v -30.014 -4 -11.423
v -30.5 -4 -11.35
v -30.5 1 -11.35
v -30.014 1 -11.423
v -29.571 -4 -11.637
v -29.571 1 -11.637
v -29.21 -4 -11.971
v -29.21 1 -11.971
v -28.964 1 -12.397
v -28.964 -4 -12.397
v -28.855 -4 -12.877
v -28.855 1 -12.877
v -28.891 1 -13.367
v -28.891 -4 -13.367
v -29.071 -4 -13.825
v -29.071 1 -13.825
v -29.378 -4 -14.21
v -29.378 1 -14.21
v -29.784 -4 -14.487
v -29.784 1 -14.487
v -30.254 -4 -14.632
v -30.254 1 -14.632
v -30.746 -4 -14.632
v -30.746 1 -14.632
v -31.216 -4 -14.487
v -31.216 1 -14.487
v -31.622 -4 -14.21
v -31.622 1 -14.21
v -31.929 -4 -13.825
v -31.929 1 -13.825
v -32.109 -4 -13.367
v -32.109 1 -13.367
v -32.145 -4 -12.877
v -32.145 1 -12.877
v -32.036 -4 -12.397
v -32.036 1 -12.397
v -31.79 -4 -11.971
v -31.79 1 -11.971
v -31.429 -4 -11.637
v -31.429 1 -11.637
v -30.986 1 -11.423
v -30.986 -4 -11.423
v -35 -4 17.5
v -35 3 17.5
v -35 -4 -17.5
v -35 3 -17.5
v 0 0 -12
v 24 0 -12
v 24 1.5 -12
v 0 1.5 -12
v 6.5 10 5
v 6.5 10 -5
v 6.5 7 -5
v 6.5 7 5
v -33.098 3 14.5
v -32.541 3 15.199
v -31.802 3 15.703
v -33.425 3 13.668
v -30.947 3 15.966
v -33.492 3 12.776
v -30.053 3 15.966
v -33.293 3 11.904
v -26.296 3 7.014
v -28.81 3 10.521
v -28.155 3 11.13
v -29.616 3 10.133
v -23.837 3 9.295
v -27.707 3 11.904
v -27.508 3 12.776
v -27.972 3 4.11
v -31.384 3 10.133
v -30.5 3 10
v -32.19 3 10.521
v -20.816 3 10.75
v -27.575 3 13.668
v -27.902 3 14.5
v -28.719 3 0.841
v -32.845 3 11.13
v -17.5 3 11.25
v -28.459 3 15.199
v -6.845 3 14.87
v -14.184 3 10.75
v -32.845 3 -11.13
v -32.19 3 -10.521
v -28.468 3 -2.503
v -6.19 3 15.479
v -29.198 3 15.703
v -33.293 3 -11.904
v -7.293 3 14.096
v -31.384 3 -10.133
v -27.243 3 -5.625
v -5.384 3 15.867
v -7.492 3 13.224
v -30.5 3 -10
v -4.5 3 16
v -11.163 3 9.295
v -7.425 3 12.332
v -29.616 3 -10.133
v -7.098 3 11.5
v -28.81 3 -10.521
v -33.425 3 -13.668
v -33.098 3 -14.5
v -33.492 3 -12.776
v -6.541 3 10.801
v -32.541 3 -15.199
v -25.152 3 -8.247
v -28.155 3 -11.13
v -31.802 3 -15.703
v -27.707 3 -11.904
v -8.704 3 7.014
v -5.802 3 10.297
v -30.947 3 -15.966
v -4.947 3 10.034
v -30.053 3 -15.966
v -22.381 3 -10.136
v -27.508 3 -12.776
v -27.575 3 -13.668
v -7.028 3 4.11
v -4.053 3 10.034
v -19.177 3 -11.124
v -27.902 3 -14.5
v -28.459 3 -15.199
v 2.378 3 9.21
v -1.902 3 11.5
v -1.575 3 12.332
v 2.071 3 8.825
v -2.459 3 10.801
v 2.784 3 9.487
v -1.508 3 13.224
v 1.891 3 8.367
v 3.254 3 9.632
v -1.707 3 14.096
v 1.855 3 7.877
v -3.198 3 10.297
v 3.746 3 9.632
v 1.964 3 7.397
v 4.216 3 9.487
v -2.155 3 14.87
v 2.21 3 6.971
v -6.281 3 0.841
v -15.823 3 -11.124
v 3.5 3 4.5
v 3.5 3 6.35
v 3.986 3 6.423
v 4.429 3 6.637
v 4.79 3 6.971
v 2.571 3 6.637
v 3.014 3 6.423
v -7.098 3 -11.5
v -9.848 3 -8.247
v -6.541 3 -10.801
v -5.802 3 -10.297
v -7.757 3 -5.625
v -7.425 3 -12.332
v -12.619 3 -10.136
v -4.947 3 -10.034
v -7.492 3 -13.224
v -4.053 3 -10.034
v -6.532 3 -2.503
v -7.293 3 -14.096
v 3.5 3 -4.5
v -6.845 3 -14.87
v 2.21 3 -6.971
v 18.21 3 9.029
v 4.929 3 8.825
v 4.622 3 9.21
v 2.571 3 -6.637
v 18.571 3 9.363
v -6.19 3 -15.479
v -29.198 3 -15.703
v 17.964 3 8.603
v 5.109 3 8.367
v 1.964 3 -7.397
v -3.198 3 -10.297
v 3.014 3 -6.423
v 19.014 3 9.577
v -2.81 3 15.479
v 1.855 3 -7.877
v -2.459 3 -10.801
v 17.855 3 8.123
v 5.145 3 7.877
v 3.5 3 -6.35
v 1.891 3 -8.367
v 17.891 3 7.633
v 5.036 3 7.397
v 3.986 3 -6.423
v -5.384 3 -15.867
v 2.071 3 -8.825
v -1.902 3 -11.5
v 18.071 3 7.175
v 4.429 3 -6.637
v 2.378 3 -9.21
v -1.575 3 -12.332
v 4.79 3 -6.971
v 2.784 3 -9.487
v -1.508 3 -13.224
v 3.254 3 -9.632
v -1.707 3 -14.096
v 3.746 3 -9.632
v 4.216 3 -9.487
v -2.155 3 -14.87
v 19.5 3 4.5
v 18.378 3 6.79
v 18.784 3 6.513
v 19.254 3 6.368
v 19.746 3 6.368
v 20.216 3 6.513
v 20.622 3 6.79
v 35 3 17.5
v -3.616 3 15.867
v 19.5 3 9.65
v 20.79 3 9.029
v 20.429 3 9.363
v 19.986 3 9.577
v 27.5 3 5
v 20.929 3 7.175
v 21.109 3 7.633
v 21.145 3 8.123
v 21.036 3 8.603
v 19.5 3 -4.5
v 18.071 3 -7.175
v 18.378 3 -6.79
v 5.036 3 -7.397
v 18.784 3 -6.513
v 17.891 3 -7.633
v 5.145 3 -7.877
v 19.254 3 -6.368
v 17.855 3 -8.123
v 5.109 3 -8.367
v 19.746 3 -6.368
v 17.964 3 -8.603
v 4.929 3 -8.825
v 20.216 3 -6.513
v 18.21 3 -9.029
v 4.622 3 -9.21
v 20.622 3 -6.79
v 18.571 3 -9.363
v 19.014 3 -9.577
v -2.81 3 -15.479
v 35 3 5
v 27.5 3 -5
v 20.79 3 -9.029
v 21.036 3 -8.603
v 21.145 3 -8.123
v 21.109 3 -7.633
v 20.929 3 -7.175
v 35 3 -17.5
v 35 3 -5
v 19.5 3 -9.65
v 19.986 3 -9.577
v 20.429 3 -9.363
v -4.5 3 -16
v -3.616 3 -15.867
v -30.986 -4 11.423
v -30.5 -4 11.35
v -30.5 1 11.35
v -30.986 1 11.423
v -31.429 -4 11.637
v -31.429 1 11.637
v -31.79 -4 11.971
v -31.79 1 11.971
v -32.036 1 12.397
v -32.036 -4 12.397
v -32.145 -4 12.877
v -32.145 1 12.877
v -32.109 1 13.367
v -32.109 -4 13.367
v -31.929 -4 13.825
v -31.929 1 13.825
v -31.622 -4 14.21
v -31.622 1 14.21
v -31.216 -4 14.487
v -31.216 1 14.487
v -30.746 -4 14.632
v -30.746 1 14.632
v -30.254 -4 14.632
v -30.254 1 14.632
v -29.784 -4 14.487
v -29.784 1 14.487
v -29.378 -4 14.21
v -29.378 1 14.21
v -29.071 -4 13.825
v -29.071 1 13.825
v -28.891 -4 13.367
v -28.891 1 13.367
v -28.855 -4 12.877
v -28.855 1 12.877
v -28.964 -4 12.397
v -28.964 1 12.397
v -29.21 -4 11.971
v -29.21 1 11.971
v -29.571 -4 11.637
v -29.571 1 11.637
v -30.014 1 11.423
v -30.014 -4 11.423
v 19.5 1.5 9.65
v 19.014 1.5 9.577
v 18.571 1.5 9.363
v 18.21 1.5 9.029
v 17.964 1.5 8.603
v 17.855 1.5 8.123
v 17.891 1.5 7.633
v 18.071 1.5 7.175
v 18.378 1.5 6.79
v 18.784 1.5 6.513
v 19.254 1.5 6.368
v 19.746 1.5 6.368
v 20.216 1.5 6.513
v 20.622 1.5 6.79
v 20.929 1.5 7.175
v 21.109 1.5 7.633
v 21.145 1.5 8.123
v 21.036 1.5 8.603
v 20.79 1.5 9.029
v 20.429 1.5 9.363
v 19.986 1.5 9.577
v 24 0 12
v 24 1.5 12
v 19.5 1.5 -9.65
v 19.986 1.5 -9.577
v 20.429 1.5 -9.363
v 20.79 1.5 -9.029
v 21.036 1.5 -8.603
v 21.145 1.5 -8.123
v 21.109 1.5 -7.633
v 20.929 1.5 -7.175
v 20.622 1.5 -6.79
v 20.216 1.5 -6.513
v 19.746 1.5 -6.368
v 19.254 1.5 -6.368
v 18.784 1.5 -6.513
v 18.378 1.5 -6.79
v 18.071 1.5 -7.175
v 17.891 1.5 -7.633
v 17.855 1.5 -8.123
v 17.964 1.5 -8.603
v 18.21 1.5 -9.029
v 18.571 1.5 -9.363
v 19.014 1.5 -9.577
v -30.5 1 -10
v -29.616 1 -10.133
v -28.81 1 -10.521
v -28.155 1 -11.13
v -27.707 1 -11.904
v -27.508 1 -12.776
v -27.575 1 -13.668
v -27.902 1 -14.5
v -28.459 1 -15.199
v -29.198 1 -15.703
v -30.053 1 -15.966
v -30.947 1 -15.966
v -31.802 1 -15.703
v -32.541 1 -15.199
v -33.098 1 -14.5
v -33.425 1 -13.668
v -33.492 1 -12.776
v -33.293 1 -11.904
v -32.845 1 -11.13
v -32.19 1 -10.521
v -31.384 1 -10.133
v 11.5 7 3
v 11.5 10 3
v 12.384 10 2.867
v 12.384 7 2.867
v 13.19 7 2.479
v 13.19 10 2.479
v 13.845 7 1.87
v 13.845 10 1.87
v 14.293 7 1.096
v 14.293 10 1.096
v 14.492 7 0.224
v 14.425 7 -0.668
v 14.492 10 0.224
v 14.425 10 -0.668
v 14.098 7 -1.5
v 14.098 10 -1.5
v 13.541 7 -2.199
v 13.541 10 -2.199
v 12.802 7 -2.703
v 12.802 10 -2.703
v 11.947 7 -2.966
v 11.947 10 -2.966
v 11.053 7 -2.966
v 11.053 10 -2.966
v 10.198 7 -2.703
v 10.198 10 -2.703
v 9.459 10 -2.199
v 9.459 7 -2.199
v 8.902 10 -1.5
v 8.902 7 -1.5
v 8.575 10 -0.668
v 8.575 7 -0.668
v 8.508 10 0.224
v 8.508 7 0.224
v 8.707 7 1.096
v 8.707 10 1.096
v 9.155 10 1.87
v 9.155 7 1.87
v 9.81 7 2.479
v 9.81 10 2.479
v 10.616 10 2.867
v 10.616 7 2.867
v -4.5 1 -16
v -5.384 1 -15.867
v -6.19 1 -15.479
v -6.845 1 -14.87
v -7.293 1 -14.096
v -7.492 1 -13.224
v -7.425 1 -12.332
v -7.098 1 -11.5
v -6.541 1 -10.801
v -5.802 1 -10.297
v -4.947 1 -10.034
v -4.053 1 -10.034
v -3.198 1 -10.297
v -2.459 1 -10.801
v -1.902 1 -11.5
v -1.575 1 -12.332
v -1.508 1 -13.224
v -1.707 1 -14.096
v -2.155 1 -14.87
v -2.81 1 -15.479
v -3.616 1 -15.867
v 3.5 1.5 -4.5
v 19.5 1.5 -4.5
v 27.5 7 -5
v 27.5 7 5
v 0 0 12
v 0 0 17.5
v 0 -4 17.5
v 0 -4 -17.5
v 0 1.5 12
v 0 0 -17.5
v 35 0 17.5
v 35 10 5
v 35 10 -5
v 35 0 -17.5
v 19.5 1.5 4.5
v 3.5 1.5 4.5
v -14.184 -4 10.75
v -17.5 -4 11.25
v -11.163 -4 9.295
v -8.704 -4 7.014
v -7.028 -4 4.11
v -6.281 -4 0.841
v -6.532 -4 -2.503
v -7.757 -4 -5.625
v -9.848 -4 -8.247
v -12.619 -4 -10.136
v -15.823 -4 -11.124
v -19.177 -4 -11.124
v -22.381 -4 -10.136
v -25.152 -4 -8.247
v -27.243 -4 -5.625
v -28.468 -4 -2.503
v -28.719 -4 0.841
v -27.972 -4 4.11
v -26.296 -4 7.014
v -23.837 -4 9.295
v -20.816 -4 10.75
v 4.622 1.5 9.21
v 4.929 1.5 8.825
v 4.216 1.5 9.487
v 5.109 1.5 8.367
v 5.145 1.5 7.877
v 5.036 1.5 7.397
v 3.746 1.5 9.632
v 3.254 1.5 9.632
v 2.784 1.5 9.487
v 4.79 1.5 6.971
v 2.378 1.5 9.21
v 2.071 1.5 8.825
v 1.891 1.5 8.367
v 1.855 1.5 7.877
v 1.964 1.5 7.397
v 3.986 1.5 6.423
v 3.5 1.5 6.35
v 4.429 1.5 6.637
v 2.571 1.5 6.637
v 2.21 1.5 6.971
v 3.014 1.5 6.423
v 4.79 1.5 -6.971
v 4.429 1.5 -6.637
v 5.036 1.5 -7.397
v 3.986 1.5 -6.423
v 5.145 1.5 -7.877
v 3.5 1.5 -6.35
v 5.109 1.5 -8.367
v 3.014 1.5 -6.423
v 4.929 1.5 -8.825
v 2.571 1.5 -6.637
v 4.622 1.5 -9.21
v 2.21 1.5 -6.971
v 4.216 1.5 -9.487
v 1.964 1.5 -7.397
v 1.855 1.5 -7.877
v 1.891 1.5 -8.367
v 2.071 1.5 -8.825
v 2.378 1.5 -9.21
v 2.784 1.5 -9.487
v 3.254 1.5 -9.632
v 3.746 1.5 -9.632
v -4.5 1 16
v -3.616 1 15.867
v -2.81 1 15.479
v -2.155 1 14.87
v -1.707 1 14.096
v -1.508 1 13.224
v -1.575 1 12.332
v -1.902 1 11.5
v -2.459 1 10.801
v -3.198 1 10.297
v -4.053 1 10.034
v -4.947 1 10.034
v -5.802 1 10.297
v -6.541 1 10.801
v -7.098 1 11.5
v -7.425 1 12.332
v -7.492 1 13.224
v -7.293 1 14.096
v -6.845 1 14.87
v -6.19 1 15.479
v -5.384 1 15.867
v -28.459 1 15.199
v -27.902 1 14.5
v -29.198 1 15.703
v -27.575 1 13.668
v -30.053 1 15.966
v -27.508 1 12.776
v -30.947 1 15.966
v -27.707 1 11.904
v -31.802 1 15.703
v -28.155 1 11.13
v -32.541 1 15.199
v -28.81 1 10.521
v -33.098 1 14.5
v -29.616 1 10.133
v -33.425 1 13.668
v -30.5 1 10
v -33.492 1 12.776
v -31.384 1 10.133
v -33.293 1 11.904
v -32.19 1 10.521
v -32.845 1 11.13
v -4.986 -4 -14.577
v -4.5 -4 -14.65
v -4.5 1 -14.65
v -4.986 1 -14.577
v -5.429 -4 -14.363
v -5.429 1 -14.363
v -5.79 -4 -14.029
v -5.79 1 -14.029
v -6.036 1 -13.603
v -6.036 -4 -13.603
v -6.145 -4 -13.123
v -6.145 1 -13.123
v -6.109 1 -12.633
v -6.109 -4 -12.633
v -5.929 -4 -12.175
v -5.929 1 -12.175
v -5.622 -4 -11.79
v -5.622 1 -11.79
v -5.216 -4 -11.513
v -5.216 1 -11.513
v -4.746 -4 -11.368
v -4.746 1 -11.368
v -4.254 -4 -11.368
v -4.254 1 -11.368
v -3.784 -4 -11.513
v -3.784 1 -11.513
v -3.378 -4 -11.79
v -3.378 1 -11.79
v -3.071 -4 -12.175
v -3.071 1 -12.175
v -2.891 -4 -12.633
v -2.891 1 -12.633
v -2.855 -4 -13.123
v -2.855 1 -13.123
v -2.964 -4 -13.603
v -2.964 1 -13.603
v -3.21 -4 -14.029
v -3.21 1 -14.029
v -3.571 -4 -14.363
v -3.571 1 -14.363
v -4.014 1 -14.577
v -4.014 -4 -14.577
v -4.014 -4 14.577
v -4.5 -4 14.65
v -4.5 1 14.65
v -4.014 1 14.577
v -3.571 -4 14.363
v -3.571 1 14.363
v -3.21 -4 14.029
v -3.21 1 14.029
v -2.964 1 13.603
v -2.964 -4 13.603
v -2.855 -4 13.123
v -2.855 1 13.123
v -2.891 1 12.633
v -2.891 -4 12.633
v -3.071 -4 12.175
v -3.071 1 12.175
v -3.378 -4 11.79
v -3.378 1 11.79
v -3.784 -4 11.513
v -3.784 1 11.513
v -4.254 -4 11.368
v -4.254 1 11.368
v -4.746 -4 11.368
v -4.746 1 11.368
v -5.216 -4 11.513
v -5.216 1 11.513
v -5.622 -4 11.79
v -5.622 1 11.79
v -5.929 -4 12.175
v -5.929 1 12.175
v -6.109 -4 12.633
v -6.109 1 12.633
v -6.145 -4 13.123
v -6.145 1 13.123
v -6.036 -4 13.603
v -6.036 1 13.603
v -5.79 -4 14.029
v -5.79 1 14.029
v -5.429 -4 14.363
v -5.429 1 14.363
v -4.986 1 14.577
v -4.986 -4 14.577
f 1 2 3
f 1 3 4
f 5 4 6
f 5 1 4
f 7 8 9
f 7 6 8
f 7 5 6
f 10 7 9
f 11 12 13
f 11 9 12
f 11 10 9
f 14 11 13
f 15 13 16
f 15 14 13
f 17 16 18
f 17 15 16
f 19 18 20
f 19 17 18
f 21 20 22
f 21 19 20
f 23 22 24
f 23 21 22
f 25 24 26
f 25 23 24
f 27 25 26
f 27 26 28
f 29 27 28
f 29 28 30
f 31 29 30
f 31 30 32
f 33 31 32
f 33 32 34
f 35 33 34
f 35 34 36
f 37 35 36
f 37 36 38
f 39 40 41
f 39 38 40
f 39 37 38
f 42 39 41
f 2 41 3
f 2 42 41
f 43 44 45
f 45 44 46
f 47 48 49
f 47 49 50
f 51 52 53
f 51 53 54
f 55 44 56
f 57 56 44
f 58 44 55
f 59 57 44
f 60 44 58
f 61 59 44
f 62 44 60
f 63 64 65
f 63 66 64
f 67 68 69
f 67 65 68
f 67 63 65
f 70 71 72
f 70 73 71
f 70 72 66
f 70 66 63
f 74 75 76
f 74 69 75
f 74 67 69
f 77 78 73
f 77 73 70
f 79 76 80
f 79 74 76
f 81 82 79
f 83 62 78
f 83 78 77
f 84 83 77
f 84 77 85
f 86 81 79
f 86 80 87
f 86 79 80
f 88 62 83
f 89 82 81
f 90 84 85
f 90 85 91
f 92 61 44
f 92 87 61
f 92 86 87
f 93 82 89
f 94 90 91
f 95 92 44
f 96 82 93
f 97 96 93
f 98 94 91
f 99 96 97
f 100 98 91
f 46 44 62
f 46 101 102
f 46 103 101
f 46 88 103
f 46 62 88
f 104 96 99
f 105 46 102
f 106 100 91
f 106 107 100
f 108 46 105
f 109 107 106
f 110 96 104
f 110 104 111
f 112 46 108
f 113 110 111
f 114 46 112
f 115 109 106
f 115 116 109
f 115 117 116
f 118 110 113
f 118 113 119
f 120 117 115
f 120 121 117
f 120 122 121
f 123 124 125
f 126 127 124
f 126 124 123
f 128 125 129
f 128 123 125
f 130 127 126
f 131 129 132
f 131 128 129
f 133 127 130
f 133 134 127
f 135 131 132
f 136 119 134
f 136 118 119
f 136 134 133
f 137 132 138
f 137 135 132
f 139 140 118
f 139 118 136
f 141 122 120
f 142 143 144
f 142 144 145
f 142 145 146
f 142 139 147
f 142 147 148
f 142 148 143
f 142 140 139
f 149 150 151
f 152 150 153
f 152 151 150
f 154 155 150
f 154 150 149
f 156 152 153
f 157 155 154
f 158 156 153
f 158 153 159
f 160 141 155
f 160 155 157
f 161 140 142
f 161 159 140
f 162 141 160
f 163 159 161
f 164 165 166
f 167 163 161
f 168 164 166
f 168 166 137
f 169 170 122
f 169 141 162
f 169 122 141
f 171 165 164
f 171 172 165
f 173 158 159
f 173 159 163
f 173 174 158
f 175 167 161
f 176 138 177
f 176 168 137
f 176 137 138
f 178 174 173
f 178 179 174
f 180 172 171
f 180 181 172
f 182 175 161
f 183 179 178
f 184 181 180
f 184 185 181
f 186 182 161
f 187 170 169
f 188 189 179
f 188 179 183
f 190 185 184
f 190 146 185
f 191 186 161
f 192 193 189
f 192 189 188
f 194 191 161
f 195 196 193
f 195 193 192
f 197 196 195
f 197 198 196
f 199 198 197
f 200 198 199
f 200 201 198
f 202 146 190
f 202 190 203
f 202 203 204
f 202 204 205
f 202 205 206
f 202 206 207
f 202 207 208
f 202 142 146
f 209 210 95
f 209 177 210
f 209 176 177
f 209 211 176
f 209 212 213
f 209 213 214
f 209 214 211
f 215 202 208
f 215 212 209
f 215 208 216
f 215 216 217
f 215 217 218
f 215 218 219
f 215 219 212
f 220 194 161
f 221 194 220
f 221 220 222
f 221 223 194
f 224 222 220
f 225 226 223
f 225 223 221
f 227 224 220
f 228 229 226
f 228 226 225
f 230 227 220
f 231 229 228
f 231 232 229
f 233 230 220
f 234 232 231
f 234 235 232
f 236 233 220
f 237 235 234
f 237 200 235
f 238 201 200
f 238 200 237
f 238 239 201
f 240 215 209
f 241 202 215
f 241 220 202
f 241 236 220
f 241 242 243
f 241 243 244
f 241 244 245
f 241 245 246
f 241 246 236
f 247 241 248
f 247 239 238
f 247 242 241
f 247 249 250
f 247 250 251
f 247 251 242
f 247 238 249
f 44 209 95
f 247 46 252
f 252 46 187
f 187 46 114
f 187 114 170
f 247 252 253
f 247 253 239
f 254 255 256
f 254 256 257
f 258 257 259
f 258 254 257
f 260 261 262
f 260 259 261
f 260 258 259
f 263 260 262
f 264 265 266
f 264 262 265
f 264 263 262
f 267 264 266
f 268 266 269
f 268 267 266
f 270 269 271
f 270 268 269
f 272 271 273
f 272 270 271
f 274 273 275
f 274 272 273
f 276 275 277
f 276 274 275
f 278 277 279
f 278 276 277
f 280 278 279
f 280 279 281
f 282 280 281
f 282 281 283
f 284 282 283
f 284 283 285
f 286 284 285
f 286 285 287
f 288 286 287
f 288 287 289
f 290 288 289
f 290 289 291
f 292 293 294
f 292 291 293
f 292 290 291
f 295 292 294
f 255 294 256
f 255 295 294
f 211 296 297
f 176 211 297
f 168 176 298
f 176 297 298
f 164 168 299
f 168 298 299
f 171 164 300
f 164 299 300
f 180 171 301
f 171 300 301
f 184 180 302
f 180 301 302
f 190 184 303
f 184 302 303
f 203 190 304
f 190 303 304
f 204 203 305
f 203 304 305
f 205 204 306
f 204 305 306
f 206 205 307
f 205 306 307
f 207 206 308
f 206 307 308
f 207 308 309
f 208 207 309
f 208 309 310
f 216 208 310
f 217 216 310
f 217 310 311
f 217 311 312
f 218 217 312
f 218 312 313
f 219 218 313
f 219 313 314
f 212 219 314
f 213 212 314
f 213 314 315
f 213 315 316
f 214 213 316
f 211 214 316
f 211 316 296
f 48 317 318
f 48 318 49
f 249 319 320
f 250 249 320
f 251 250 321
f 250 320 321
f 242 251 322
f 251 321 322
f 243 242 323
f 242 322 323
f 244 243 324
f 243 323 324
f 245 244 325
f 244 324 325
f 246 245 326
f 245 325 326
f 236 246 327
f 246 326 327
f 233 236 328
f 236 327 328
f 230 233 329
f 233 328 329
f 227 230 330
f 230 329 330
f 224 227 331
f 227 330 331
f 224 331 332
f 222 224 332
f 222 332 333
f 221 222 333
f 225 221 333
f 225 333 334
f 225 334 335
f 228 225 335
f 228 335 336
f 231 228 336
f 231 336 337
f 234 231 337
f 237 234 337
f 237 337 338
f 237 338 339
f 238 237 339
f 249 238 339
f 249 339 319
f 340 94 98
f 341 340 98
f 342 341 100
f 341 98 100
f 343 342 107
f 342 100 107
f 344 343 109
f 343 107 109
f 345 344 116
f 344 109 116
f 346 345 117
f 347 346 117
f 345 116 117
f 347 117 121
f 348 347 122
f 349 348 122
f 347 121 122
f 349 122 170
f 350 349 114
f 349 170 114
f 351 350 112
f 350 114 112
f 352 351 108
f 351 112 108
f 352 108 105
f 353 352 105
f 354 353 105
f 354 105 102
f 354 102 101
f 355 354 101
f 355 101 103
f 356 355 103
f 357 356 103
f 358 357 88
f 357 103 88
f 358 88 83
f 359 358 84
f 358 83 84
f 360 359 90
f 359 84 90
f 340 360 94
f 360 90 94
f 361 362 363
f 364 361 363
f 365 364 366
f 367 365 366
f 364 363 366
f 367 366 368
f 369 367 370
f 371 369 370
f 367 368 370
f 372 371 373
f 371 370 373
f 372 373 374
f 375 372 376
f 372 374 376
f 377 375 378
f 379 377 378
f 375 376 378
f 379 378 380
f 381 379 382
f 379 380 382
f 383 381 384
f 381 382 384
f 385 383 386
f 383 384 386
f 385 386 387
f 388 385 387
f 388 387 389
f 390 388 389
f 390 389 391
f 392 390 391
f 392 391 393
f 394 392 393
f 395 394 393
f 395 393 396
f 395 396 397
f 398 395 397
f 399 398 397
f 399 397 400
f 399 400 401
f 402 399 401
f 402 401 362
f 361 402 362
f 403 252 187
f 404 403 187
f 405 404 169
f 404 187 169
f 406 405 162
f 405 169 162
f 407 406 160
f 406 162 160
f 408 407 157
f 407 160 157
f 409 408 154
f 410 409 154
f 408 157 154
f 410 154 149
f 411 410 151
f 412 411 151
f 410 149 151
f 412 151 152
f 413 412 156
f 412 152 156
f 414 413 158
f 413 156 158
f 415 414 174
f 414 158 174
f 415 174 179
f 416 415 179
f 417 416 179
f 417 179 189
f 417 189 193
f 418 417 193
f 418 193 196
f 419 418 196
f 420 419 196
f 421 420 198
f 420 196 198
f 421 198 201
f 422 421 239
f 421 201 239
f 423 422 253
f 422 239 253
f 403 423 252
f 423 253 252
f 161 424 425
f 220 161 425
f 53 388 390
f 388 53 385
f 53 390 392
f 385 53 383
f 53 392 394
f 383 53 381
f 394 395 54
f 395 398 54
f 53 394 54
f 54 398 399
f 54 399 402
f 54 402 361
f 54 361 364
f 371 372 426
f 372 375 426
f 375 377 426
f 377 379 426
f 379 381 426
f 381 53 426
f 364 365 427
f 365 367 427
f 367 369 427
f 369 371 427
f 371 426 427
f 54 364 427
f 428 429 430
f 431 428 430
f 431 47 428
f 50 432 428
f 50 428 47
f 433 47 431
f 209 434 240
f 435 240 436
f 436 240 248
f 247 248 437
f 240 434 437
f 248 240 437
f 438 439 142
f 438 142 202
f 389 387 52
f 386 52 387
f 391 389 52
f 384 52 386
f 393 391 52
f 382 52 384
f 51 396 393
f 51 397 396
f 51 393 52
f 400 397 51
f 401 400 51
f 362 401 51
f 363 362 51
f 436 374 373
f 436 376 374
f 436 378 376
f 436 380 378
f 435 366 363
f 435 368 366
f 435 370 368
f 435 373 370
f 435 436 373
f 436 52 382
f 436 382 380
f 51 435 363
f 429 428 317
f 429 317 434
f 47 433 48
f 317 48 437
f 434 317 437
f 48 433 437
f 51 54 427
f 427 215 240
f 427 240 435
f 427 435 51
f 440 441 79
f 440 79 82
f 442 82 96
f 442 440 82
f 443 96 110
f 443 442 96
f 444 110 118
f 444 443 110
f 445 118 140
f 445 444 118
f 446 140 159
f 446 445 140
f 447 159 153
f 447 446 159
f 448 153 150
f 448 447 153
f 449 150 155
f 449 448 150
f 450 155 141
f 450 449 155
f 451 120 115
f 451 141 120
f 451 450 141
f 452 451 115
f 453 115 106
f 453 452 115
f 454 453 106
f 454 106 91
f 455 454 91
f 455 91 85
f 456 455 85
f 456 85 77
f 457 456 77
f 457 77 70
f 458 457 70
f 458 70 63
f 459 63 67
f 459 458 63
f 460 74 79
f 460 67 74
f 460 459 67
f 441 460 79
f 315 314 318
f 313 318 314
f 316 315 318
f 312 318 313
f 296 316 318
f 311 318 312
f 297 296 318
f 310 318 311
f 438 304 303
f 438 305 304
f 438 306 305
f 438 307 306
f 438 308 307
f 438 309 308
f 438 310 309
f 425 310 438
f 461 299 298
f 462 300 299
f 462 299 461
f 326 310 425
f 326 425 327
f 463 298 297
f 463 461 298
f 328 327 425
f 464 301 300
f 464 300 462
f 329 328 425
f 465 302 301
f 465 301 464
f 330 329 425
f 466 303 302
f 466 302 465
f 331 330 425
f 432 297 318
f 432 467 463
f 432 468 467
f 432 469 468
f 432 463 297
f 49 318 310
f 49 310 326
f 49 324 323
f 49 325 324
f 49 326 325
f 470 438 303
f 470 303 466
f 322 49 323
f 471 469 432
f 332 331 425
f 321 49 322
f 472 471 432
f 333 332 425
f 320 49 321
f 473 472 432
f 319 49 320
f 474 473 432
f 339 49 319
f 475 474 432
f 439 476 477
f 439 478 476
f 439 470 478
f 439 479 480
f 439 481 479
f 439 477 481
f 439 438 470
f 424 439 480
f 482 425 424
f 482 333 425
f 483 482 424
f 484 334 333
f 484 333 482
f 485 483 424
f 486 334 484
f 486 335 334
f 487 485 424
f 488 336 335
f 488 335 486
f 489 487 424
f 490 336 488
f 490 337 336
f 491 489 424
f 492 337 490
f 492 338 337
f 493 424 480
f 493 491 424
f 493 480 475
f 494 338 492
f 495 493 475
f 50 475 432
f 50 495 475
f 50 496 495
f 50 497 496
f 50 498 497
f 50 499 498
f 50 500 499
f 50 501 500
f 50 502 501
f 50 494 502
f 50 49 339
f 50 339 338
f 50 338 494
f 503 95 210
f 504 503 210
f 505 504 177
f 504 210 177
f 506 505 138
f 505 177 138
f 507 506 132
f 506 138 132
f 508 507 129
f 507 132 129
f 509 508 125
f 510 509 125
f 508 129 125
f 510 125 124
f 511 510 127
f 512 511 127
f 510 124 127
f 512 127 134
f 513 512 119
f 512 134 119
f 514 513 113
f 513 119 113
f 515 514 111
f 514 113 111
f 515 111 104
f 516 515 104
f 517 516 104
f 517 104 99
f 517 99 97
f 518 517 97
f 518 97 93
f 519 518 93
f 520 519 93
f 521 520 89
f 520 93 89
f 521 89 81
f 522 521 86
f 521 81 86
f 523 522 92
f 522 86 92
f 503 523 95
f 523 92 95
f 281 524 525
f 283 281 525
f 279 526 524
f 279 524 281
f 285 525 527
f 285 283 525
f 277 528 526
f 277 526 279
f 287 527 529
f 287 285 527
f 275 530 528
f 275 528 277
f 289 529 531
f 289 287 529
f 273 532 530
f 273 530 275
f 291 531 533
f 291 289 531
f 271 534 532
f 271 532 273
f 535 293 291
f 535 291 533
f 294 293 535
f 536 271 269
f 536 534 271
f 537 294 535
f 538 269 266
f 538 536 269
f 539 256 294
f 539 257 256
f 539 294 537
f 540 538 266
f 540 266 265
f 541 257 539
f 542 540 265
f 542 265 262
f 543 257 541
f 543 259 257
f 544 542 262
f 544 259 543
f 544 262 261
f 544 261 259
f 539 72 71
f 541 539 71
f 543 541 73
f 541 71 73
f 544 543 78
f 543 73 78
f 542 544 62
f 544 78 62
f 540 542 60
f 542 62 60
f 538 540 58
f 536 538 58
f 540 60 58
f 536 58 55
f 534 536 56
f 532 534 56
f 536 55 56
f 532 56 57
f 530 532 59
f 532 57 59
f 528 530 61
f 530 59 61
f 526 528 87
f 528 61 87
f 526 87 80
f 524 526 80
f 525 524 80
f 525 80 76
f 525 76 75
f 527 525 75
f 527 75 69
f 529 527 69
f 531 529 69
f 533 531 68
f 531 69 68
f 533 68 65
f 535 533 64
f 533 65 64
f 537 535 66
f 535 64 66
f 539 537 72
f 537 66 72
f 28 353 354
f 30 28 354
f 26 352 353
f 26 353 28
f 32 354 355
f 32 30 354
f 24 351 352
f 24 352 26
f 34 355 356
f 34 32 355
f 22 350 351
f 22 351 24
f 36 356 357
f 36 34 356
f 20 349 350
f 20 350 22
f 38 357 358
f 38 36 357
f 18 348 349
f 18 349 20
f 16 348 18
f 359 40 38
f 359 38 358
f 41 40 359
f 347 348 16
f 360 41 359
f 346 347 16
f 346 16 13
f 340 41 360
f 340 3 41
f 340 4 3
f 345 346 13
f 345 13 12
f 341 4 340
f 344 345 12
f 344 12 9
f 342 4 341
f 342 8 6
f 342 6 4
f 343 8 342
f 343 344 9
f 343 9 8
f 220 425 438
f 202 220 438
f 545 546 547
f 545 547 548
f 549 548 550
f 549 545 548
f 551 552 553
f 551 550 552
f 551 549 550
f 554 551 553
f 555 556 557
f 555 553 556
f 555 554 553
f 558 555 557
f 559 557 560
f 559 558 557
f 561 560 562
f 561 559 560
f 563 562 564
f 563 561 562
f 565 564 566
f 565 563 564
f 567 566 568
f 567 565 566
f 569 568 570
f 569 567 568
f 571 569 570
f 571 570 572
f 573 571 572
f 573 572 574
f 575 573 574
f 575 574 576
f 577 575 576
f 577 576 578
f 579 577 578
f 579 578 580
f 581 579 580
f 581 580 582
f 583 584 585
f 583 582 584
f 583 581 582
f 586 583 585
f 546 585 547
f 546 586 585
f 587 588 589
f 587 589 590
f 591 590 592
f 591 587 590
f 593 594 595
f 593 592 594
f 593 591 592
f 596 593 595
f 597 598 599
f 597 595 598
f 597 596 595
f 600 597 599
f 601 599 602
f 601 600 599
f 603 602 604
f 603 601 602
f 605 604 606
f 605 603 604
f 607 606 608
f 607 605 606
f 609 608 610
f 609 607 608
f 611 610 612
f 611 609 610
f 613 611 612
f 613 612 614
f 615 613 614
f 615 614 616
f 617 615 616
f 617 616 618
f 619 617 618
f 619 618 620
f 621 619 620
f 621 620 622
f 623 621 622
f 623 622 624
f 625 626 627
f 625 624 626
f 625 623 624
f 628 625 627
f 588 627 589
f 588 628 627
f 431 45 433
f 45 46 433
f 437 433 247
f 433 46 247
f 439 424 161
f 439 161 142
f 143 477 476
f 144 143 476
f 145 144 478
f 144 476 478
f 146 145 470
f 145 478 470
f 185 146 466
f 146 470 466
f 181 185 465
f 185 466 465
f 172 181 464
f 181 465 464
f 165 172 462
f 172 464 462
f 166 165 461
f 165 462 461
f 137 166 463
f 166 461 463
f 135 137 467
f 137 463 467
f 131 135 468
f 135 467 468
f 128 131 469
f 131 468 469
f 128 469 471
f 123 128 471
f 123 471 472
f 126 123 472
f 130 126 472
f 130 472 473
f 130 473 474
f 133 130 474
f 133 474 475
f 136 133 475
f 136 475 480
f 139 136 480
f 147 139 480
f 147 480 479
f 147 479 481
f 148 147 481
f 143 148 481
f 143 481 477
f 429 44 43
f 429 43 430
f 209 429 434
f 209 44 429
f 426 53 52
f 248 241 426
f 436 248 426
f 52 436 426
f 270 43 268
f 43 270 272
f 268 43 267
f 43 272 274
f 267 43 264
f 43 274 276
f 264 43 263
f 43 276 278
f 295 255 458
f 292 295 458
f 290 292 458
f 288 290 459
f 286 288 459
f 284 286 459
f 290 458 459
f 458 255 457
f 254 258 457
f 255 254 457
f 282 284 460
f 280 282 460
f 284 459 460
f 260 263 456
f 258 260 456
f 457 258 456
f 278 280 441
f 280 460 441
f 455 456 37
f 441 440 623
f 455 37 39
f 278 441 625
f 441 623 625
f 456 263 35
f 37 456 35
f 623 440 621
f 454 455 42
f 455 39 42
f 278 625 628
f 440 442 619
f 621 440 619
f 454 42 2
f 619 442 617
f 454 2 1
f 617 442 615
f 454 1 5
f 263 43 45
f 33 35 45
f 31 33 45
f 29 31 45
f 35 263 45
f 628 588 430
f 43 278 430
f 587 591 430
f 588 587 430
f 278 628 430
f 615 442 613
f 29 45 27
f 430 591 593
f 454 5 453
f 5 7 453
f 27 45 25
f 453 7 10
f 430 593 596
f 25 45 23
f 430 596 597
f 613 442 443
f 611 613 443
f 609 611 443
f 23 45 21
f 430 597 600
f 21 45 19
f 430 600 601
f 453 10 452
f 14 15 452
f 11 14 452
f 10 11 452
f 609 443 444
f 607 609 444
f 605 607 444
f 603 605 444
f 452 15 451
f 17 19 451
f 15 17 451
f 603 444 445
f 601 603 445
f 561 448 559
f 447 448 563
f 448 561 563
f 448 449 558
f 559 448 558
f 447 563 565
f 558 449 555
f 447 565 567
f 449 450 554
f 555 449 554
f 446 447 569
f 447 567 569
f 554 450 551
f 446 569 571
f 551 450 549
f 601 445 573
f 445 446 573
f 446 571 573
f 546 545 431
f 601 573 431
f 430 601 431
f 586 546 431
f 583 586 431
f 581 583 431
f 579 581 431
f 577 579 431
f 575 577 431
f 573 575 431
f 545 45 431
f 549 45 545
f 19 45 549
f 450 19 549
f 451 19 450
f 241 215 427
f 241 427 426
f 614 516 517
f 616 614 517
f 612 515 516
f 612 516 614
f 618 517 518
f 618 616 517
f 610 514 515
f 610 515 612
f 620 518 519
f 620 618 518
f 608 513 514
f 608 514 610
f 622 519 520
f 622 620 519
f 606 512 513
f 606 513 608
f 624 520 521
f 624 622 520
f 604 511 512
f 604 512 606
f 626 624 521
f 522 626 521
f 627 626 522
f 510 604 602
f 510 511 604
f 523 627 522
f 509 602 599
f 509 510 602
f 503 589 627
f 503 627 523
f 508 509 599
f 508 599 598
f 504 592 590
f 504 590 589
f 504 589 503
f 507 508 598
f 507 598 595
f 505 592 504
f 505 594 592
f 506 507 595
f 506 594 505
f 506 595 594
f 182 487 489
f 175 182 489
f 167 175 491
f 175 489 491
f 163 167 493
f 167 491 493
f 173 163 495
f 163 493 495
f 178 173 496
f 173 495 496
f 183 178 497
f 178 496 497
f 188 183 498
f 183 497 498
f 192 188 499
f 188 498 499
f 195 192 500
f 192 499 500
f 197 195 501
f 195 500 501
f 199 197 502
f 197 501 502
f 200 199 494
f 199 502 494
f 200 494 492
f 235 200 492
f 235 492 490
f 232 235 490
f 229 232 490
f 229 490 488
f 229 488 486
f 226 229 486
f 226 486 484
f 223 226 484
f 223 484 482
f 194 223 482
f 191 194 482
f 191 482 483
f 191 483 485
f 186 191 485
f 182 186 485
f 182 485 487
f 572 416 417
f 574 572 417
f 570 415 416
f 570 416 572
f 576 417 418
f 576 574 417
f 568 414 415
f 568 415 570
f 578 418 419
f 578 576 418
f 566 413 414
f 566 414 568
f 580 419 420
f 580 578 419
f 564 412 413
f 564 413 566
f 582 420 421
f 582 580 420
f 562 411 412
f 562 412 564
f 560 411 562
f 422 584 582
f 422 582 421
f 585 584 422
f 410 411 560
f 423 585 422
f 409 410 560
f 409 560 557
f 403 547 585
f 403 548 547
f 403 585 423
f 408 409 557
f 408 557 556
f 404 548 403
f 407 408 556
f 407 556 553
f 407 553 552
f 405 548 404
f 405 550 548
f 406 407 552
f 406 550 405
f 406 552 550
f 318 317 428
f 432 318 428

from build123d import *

# Parameters (mm, degrees)
SKETCH1_W               = 70
SKETCH1_H               = 35
BOSS_EXTRUDE1_DEPTH     = 3
BOSS_EXTRUDE2_START     = -3
SKETCH3_W               = 35
SKETCH3_H               = 35
BOSS_EXTRUDE2_DEPTH     = 4
CUT_EXTRUDE1_DEPTH      = 40.752358421
CUT_EXTRUDE1_DEPTH_BACK = 40.752358421
SKETCH2_R               = 1.65
SKETCH2_R_2             = 11.25
SKETCH5_R               = 3
CUT_EXTRUDE3_DEPTH      = 2
SKETCH6_R               = 1.65
SKETCH6_W               = 16
SKETCH6_H               = 9
CUT_EXTRUDE4_DEPTH      = 40.33509883
SKETCH7_W               = 24
SKETCH7_H               = 24
CUT_EXTRUDE5_DEPTH      = 1.5
SKETCH8_W               = 7.5
SKETCH8_H               = 10
BOSS_EXTRUDE3_DEPTH     = 7
SKETCH9_W               = 10
SKETCH9_H               = 3
BOSS_EXTRUDE4_DEPTH     = 21
CUT_EXTRUDE6_REACH      = 43.56
SKETCH10_R              = 3


with BuildPart() as part:
    # Sketch1 → Boss-Extrude1 (new body)
    with BuildSketch(Plane(origin=(0, 0, 0), x_dir=(1, 0, 0), z_dir=(0, 1, 0))):
        Rectangle(SKETCH1_W, SKETCH1_H)
    extrude(amount=BOSS_EXTRUDE1_DEPTH)

    # Sketch3 → Boss-Extrude2 (add)
    with BuildSketch(Plane(origin=(0, 3, 0), x_dir=(1, 0, 0), z_dir=(0, 1, 0)).offset(BOSS_EXTRUDE2_START)):
        with Locations((-17.5, 0)):
            Rectangle(SKETCH3_W, SKETCH3_H)
    extrude(amount=-BOSS_EXTRUDE2_DEPTH)

    # Sketch2 → Cut-Extrude1 (cut, two sides: drawn at the far end of the back side and taken through both)
    with BuildSketch(Plane(origin=(0, 3, 0), x_dir=(1, 0, 0), z_dir=(0, 1, 0)).offset(-CUT_EXTRUDE1_DEPTH_BACK)):
        with Locations(Location((-30.5, 13, 0), (0, 0, 270))):
            Circle(SKETCH2_R)
        with Locations(Location((-4.5, 13, 0), (0, 0, 90))):
            Circle(SKETCH2_R)
        with Locations(Location((-4.5, -13, 0), (0, 0, 270))):
            Circle(SKETCH2_R)
        with Locations(Location((-30.5, -13, 0), (0, 0, 90))):
            Circle(SKETCH2_R)
        with Locations(Location((-17.5, 0, 0), (0, 0, 270))):
            Circle(SKETCH2_R_2)
    extrude(amount=CUT_EXTRUDE1_DEPTH + CUT_EXTRUDE1_DEPTH_BACK, mode=Mode.SUBTRACT)

    # Sketch5 → Cut-Extrude3 (cut)
    with BuildSketch(Plane(origin=(0, 3, 0), x_dir=(1, 0, 0), z_dir=(0, 1, 0))):
        with Locations(Location((-30.5, 13, 0), (0, 0, 270))):
            Circle(SKETCH5_R)
        with Locations(Location((-4.5, 13, 0), (0, 0, 90))):
            Circle(SKETCH5_R)
        with Locations(Location((-4.5, -13, 0), (0, 0, 270))):
            Circle(SKETCH5_R)
        with Locations(Location((-30.5, -13, 0), (0, 0, 90))):
            Circle(SKETCH5_R)
    extrude(amount=-CUT_EXTRUDE3_DEPTH, mode=Mode.SUBTRACT)

    # Sketch6 → Cut-Extrude4 (cut, through all)
    with BuildSketch(Plane.XZ):
        with Locations(Location((3.5, 8, 0), (0, 0, 270))):
            Circle(SKETCH6_R)
        with Locations(Location((19.5, 8, 0), (0, 0, 90))):
            Circle(SKETCH6_R)
        with Locations(Location((19.5, -8, 0), (0, 0, 270))):
            Circle(SKETCH6_R)
        with Locations(Location((3.5, -8, 0), (0, 0, 90))):
            Circle(SKETCH6_R)
        with Locations((11.5, 0)):
            Rectangle(SKETCH6_W, SKETCH6_H)
    extrude(amount=-CUT_EXTRUDE4_DEPTH, mode=Mode.SUBTRACT)

    # Sketch7 → Cut-Extrude5 (cut)
    with BuildSketch(Plane(origin=(0, 0, 0), x_dir=(-1, 0, 0), z_dir=(0, -1, 0))):
        with Locations((-12, 0)):
            Rectangle(SKETCH7_W, SKETCH7_H)
    extrude(amount=-CUT_EXTRUDE5_DEPTH, mode=Mode.SUBTRACT)

    # Sketch8 → Boss-Extrude3 (add)
    with BuildSketch(Plane(origin=(0, 3, 0), x_dir=(1, 0, 0), z_dir=(0, 1, 0))):
        with Locations((31.25, 0)):
            Rectangle(SKETCH8_W, SKETCH8_H)
    extrude(amount=BOSS_EXTRUDE3_DEPTH)

    # Sketch9 → Boss-Extrude4 (add)
    with BuildSketch(Plane.ZY.offset(-27.5)):
        with Locations((0, 8.5)):
            Rectangle(SKETCH9_W, SKETCH9_H)
    extrude(amount=BOSS_EXTRUDE4_DEPTH)

    # Sketch10 → Cut-Extrude6 (cut, up to next)
    with BuildSketch(Plane(origin=(0, 10, 0), x_dir=(1, 0, 0), z_dir=(0, 1, 0)), mode=Mode.PRIVATE) as cut_extrude6_sk1:
        with Locations(Location((11.5, 0, 0), (0, 0, 270))):
            Circle(SKETCH10_R)
    cut_extrude6_tool1 = extrude(cut_extrude6_sk1.sketch, amount=-CUT_EXTRUDE6_REACH, mode=Mode.PRIVATE) & part.part
    add(cut_extrude6_tool1.solids().sort_by_distance((11.5, 10, 0))[0], mode=Mode.SUBTRACT)


solid = part.part
